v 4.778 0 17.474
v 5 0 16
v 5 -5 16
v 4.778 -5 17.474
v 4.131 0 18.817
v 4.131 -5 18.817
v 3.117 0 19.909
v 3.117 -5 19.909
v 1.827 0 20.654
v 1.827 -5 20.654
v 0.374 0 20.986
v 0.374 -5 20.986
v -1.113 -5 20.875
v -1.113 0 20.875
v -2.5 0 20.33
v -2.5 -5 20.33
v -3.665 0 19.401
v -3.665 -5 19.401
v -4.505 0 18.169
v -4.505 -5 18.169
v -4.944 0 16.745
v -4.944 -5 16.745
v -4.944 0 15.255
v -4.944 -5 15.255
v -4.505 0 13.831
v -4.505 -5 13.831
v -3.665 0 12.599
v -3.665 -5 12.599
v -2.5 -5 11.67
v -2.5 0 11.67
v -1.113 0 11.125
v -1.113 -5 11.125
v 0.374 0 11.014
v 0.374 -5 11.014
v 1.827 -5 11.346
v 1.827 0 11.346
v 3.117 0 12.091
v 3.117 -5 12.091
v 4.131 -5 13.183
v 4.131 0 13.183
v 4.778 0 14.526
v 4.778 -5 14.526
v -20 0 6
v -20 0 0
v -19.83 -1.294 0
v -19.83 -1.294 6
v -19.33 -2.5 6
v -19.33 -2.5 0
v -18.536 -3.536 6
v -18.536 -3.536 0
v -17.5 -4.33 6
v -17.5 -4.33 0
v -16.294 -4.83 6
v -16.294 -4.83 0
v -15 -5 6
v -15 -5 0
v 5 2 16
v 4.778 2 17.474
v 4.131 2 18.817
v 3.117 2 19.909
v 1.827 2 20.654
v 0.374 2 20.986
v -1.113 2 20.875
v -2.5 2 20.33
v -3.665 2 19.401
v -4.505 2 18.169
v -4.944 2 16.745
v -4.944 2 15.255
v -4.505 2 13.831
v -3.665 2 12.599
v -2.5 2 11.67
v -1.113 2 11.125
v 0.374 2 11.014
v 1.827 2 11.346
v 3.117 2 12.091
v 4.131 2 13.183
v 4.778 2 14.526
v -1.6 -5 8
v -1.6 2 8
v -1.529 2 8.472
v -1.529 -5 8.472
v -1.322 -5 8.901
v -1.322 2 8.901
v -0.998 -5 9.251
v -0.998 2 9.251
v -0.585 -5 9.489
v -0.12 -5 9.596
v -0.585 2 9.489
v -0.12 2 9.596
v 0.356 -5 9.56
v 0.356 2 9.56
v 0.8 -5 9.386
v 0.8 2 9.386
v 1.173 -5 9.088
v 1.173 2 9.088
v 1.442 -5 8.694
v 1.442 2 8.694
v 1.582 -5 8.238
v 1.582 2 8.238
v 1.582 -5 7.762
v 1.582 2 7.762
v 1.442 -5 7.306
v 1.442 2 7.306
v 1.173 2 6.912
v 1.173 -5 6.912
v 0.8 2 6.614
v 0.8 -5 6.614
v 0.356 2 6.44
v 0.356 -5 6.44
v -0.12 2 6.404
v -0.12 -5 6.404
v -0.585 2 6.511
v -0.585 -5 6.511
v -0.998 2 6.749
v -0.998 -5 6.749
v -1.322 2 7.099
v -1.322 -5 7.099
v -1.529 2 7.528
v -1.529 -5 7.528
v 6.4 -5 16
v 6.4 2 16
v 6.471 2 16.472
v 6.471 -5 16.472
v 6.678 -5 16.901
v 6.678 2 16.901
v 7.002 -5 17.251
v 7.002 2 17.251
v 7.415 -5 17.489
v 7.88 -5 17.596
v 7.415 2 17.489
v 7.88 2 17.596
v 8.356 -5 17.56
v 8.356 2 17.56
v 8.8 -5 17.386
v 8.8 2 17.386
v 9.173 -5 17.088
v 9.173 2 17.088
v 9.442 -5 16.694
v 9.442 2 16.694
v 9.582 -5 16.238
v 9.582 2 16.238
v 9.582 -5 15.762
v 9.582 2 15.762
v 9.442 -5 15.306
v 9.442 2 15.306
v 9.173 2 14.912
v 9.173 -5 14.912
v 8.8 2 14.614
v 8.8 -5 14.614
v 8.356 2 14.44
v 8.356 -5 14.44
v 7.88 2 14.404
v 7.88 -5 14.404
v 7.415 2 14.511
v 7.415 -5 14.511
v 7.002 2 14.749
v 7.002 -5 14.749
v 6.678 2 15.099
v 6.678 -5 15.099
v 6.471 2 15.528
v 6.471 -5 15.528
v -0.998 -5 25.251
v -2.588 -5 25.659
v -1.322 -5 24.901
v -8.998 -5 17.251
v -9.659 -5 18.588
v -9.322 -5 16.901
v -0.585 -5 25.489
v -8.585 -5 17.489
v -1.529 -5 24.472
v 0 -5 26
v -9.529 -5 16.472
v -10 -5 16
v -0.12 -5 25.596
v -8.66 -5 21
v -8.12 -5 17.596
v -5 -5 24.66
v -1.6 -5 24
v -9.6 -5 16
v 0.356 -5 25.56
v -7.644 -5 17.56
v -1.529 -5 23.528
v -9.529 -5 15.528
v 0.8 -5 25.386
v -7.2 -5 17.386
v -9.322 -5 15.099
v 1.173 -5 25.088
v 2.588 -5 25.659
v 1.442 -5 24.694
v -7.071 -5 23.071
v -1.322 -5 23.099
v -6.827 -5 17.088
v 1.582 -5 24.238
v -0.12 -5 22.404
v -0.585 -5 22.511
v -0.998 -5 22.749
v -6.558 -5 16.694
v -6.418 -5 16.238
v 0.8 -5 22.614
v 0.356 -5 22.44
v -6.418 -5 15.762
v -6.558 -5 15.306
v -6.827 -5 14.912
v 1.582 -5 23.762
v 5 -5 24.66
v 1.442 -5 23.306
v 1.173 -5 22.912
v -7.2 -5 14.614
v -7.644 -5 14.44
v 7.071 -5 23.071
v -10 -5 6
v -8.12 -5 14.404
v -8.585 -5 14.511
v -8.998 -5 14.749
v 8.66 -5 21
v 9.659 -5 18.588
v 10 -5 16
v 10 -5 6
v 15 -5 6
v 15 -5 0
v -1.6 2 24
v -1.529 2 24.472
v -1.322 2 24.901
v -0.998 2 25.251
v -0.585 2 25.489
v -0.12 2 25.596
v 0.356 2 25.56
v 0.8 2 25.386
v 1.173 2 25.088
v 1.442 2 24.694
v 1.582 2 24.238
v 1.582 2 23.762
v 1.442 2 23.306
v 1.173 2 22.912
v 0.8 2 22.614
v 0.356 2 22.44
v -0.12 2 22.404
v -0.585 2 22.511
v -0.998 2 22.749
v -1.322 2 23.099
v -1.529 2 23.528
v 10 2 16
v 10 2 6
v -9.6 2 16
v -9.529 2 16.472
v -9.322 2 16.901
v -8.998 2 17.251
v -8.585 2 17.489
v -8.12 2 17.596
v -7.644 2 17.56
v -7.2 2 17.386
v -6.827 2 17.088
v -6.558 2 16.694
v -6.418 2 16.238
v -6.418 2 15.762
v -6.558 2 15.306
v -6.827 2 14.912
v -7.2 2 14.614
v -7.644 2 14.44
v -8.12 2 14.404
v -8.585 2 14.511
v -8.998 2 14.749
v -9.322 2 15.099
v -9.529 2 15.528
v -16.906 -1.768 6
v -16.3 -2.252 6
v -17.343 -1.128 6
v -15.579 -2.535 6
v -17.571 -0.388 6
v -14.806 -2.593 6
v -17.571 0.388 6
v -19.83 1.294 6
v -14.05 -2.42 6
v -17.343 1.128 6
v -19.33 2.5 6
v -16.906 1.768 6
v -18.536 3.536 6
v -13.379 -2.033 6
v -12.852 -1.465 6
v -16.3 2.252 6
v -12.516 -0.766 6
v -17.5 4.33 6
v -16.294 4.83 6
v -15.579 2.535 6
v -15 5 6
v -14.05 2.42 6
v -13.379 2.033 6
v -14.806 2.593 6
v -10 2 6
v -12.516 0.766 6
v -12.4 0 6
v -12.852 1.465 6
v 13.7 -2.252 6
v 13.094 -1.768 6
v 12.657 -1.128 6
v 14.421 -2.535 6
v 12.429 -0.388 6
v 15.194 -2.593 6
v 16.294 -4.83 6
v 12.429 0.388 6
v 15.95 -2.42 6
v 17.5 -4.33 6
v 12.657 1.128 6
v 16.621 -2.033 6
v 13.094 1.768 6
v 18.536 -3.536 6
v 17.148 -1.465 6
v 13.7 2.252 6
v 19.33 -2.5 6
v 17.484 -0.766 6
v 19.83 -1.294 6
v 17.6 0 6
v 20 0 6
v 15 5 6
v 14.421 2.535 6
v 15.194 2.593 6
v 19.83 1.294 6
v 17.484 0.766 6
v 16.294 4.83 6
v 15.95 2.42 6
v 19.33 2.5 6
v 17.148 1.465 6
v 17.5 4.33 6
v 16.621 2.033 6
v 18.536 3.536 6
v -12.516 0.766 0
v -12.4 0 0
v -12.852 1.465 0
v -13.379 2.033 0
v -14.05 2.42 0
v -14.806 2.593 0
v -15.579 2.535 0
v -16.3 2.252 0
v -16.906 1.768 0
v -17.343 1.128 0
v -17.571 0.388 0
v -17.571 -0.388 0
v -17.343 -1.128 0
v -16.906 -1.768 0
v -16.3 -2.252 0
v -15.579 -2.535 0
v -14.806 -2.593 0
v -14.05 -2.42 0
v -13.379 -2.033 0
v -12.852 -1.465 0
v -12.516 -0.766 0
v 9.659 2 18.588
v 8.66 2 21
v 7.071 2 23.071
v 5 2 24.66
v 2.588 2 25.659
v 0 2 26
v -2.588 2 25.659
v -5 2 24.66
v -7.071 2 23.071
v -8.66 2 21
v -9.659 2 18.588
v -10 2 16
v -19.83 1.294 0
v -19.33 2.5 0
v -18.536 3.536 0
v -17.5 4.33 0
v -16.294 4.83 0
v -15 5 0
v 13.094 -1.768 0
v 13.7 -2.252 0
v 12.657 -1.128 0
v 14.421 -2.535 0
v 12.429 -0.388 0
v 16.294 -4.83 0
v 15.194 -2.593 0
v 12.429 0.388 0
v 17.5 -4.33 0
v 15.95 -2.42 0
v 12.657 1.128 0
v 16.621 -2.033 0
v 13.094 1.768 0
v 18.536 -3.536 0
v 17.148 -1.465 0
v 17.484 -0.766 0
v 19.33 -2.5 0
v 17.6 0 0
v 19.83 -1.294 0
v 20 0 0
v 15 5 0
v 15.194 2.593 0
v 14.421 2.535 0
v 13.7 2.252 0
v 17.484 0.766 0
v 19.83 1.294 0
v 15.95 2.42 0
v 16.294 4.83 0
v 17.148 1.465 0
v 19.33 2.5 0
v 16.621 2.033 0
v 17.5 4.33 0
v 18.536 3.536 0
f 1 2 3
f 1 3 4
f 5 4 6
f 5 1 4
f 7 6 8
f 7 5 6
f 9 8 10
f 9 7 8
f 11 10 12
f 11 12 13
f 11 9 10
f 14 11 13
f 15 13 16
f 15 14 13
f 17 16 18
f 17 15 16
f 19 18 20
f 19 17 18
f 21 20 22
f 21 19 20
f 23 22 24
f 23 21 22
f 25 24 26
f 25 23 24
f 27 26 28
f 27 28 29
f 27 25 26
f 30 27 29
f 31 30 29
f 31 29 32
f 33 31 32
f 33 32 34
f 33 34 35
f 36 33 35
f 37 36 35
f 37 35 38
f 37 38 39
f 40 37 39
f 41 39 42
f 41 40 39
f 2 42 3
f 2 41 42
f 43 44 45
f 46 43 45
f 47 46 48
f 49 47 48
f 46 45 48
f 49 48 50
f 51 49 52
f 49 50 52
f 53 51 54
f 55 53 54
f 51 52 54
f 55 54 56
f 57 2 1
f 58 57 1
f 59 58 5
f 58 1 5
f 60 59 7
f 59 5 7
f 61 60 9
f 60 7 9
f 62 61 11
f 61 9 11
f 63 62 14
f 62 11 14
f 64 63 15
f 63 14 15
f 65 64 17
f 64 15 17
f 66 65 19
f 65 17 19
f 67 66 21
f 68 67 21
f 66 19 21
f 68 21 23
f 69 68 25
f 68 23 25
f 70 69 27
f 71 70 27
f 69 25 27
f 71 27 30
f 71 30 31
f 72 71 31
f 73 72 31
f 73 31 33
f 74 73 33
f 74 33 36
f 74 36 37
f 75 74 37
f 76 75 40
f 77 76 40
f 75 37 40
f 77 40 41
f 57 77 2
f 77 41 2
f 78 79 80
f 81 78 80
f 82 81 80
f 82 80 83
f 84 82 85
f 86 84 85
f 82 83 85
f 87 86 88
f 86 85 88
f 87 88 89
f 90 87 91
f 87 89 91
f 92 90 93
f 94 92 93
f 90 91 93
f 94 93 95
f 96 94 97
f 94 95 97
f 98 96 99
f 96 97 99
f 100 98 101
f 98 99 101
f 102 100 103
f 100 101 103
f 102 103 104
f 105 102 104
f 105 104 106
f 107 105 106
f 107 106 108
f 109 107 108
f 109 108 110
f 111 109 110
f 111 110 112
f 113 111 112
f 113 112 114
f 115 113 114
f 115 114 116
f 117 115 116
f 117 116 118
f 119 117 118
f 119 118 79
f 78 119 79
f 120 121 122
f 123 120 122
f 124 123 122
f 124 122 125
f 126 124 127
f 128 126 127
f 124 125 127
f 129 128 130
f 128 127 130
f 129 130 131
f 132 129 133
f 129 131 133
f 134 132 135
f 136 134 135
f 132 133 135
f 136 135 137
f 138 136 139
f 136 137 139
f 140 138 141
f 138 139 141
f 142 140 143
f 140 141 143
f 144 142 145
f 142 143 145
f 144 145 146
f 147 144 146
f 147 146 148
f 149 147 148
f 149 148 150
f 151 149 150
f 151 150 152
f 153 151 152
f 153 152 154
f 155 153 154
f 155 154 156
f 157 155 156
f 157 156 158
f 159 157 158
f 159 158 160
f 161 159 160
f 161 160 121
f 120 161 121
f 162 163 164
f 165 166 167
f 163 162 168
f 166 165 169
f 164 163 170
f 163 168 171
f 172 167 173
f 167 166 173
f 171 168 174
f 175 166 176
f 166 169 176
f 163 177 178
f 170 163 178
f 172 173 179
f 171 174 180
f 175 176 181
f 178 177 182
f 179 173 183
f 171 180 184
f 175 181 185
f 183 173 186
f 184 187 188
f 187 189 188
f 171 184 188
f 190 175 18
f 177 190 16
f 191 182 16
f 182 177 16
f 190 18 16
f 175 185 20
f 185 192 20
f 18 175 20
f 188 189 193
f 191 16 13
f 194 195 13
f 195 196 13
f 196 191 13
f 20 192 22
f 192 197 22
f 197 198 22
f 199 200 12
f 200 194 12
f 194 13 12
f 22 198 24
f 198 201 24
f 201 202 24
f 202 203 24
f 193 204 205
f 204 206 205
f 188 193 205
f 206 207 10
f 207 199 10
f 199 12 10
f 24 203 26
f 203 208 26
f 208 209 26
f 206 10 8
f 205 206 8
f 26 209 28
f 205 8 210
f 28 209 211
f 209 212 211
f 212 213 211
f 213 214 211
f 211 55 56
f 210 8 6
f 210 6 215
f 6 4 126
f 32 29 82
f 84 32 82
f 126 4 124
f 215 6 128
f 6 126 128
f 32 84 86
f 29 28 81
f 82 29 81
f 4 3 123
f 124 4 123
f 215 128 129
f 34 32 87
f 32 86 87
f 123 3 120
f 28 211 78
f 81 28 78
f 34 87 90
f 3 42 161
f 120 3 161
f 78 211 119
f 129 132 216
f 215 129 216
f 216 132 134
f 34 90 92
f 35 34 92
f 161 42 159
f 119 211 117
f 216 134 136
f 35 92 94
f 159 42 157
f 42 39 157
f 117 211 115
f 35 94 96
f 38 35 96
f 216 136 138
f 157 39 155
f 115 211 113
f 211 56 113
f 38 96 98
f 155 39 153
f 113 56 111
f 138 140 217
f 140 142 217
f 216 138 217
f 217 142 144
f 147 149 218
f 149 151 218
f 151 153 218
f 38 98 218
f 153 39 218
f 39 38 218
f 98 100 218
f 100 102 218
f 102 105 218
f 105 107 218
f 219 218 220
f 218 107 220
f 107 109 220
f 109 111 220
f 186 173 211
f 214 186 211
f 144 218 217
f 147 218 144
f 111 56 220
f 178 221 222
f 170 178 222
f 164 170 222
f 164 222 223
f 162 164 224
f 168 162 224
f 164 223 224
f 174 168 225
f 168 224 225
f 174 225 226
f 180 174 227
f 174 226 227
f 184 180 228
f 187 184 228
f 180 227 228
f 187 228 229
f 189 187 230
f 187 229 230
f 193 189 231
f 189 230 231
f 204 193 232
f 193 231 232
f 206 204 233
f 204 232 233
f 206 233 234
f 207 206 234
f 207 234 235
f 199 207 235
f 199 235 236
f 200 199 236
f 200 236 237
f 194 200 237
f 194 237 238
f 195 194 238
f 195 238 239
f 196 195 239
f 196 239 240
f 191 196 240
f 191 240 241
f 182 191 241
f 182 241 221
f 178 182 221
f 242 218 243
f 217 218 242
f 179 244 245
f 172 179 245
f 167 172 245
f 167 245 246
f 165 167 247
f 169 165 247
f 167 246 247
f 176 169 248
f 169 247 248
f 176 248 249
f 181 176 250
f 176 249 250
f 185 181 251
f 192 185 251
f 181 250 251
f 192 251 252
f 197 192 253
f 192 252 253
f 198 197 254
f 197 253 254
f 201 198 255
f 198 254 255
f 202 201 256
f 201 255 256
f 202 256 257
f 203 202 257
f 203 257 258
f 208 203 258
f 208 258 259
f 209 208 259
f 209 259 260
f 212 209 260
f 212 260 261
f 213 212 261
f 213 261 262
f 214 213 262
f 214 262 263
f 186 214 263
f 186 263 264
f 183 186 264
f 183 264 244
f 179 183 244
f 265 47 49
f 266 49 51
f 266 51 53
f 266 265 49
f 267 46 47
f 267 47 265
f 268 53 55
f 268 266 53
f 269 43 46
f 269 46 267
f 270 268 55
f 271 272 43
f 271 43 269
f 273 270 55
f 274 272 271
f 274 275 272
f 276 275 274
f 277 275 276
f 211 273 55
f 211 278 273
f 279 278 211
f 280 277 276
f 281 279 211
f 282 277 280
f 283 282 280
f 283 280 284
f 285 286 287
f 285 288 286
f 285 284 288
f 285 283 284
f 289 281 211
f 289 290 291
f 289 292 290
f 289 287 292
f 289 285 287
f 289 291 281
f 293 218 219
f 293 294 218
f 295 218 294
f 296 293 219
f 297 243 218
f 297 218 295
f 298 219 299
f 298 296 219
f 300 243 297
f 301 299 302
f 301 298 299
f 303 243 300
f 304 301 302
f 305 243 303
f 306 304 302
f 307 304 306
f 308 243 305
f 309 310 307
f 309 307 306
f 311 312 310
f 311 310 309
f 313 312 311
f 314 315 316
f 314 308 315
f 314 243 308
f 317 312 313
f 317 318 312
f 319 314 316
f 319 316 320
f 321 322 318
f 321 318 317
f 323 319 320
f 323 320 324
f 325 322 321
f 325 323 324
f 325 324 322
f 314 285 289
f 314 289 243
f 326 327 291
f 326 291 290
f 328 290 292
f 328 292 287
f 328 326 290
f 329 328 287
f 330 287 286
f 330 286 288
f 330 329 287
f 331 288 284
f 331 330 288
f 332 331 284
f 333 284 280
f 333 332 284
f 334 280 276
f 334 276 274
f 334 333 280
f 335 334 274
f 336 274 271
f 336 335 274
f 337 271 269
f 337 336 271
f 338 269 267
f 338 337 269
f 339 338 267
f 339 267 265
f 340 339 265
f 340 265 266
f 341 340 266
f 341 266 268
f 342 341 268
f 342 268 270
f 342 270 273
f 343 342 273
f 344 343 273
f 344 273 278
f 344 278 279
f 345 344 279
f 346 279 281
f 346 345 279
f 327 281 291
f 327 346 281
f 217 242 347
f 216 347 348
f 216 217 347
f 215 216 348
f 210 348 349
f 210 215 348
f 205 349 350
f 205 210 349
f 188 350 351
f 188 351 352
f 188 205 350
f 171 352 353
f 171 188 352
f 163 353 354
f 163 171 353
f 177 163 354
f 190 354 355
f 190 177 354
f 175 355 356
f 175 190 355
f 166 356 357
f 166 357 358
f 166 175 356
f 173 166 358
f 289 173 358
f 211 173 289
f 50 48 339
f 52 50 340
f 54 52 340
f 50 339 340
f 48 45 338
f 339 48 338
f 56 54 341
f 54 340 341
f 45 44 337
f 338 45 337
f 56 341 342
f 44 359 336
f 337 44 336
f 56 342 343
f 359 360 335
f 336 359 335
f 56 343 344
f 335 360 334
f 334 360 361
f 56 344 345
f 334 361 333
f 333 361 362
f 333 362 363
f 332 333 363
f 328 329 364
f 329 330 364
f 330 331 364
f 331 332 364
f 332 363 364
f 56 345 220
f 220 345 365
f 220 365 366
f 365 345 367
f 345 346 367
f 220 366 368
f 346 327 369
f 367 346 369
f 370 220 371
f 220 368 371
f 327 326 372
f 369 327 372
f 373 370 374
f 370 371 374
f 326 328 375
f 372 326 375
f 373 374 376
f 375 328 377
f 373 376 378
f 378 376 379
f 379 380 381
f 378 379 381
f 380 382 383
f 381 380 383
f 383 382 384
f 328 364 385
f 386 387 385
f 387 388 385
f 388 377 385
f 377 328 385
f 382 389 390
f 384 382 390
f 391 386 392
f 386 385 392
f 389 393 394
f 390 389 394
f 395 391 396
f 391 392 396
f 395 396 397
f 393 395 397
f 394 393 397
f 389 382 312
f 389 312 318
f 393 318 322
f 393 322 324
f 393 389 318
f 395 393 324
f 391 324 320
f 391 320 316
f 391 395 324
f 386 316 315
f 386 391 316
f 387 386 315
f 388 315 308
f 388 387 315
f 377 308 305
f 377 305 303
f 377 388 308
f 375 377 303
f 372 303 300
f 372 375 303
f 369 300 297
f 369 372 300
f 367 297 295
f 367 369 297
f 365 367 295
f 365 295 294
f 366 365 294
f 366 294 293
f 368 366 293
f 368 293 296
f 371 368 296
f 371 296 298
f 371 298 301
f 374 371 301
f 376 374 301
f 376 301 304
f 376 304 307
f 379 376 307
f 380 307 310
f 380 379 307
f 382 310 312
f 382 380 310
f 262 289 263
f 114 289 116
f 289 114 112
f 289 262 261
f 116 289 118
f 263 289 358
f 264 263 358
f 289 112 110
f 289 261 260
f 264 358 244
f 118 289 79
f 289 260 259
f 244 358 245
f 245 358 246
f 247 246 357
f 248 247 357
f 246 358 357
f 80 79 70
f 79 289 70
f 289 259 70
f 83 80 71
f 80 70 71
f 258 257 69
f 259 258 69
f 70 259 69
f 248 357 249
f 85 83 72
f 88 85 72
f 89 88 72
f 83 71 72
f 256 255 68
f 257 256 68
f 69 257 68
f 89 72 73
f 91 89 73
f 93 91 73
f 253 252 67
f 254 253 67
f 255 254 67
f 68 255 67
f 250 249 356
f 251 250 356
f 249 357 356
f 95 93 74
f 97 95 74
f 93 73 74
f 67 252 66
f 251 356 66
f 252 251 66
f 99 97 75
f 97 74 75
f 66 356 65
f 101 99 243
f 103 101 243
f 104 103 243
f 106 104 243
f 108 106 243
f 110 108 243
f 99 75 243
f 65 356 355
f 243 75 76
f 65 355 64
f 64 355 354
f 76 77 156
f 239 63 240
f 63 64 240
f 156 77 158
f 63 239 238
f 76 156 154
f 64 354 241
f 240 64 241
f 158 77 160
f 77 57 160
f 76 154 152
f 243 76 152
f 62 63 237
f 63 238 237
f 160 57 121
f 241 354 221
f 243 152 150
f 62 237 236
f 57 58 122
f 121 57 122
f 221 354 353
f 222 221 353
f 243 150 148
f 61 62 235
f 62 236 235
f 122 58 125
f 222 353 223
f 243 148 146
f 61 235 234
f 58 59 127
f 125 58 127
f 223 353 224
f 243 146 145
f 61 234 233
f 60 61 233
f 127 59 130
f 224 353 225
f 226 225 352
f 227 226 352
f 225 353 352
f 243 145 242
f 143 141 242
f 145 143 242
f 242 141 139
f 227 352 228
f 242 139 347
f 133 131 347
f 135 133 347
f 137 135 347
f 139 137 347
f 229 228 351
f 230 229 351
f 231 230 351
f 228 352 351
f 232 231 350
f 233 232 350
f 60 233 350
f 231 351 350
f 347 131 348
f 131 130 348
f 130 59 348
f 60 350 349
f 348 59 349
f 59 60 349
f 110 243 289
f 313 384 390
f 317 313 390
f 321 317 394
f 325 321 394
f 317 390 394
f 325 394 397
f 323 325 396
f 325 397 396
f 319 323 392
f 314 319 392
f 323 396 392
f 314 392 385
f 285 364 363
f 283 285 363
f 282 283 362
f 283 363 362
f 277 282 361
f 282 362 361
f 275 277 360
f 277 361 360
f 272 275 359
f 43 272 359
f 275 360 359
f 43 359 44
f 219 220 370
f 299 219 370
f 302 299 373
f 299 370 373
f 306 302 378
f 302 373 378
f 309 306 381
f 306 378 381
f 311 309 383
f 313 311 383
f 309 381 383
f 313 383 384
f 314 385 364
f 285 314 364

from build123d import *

# Parameters (mm, degrees)
F0_R          = 2.6
F1_DEPTH      = 6
F2_R          = 5
F3_DEPTH      = 5
F3_DEPTH_BACK = 2
F4_R          = 1.6
F5_DEPTH      = 7.001


with BuildPart() as f1:
    # F0 (on Top) → F1 (new body)
    with BuildSketch(Plane.XY):
        with BuildLine():
            Line((-15, -5), (15, -5))
            ThreePointArc((15, -5), (18.535534, -3.535534), (20, 0))
            ThreePointArc((20, 0), (18.535534, 3.535534), (15, 5))
            Line((15, 5), (-15, 5))
            ThreePointArc((-15, 5), (-18.535534, 3.535534), (-20, 0))
            ThreePointArc((-20, 0), (-18.535534, -3.535534), (-15, -5))
        make_face()
        with Locations((-15, 0)):
            Circle(F0_R, mode=Mode.SUBTRACT)
        with Locations((15, 0)):
            Circle(F0_R, mode=Mode.SUBTRACT)
    extrude(amount=F1_DEPTH)

    # F2 (on Front) → F3 (join, two sides)
    with BuildSketch(Plane.XZ) as f3_sk:
        with BuildLine():
            Line((10, 6), (10, 16))
            ThreePointArc((10, 16), (0, 26), (-10, 16))
            Line((-10, 16), (-10, 6))
            Line((-10, 6), (10, 6))
        make_face()
        with Locations((0, 16)):
            Circle(F2_R, mode=Mode.SUBTRACT)
    extrude(amount=F3_DEPTH)
    extrude(f3_sk.sketch, amount=-F3_DEPTH_BACK)

    # F4 (on face) → F5 (cut, through all)
    with BuildSketch(Plane(origin=(0, 2, 0), x_dir=(-1, 0, 0), z_dir=(0, 1, 0))):
        with Locations((0, 24)):
            Circle(F4_R)
        with Locations((8, 16)):
            Circle(F4_R)
        with Locations((0, 8)):
            Circle(F4_R)
        with Locations((-8, 16)):
            Circle(F4_R)
    extrude(amount=-F5_DEPTH, mode=Mode.SUBTRACT)


solid = f1.part
